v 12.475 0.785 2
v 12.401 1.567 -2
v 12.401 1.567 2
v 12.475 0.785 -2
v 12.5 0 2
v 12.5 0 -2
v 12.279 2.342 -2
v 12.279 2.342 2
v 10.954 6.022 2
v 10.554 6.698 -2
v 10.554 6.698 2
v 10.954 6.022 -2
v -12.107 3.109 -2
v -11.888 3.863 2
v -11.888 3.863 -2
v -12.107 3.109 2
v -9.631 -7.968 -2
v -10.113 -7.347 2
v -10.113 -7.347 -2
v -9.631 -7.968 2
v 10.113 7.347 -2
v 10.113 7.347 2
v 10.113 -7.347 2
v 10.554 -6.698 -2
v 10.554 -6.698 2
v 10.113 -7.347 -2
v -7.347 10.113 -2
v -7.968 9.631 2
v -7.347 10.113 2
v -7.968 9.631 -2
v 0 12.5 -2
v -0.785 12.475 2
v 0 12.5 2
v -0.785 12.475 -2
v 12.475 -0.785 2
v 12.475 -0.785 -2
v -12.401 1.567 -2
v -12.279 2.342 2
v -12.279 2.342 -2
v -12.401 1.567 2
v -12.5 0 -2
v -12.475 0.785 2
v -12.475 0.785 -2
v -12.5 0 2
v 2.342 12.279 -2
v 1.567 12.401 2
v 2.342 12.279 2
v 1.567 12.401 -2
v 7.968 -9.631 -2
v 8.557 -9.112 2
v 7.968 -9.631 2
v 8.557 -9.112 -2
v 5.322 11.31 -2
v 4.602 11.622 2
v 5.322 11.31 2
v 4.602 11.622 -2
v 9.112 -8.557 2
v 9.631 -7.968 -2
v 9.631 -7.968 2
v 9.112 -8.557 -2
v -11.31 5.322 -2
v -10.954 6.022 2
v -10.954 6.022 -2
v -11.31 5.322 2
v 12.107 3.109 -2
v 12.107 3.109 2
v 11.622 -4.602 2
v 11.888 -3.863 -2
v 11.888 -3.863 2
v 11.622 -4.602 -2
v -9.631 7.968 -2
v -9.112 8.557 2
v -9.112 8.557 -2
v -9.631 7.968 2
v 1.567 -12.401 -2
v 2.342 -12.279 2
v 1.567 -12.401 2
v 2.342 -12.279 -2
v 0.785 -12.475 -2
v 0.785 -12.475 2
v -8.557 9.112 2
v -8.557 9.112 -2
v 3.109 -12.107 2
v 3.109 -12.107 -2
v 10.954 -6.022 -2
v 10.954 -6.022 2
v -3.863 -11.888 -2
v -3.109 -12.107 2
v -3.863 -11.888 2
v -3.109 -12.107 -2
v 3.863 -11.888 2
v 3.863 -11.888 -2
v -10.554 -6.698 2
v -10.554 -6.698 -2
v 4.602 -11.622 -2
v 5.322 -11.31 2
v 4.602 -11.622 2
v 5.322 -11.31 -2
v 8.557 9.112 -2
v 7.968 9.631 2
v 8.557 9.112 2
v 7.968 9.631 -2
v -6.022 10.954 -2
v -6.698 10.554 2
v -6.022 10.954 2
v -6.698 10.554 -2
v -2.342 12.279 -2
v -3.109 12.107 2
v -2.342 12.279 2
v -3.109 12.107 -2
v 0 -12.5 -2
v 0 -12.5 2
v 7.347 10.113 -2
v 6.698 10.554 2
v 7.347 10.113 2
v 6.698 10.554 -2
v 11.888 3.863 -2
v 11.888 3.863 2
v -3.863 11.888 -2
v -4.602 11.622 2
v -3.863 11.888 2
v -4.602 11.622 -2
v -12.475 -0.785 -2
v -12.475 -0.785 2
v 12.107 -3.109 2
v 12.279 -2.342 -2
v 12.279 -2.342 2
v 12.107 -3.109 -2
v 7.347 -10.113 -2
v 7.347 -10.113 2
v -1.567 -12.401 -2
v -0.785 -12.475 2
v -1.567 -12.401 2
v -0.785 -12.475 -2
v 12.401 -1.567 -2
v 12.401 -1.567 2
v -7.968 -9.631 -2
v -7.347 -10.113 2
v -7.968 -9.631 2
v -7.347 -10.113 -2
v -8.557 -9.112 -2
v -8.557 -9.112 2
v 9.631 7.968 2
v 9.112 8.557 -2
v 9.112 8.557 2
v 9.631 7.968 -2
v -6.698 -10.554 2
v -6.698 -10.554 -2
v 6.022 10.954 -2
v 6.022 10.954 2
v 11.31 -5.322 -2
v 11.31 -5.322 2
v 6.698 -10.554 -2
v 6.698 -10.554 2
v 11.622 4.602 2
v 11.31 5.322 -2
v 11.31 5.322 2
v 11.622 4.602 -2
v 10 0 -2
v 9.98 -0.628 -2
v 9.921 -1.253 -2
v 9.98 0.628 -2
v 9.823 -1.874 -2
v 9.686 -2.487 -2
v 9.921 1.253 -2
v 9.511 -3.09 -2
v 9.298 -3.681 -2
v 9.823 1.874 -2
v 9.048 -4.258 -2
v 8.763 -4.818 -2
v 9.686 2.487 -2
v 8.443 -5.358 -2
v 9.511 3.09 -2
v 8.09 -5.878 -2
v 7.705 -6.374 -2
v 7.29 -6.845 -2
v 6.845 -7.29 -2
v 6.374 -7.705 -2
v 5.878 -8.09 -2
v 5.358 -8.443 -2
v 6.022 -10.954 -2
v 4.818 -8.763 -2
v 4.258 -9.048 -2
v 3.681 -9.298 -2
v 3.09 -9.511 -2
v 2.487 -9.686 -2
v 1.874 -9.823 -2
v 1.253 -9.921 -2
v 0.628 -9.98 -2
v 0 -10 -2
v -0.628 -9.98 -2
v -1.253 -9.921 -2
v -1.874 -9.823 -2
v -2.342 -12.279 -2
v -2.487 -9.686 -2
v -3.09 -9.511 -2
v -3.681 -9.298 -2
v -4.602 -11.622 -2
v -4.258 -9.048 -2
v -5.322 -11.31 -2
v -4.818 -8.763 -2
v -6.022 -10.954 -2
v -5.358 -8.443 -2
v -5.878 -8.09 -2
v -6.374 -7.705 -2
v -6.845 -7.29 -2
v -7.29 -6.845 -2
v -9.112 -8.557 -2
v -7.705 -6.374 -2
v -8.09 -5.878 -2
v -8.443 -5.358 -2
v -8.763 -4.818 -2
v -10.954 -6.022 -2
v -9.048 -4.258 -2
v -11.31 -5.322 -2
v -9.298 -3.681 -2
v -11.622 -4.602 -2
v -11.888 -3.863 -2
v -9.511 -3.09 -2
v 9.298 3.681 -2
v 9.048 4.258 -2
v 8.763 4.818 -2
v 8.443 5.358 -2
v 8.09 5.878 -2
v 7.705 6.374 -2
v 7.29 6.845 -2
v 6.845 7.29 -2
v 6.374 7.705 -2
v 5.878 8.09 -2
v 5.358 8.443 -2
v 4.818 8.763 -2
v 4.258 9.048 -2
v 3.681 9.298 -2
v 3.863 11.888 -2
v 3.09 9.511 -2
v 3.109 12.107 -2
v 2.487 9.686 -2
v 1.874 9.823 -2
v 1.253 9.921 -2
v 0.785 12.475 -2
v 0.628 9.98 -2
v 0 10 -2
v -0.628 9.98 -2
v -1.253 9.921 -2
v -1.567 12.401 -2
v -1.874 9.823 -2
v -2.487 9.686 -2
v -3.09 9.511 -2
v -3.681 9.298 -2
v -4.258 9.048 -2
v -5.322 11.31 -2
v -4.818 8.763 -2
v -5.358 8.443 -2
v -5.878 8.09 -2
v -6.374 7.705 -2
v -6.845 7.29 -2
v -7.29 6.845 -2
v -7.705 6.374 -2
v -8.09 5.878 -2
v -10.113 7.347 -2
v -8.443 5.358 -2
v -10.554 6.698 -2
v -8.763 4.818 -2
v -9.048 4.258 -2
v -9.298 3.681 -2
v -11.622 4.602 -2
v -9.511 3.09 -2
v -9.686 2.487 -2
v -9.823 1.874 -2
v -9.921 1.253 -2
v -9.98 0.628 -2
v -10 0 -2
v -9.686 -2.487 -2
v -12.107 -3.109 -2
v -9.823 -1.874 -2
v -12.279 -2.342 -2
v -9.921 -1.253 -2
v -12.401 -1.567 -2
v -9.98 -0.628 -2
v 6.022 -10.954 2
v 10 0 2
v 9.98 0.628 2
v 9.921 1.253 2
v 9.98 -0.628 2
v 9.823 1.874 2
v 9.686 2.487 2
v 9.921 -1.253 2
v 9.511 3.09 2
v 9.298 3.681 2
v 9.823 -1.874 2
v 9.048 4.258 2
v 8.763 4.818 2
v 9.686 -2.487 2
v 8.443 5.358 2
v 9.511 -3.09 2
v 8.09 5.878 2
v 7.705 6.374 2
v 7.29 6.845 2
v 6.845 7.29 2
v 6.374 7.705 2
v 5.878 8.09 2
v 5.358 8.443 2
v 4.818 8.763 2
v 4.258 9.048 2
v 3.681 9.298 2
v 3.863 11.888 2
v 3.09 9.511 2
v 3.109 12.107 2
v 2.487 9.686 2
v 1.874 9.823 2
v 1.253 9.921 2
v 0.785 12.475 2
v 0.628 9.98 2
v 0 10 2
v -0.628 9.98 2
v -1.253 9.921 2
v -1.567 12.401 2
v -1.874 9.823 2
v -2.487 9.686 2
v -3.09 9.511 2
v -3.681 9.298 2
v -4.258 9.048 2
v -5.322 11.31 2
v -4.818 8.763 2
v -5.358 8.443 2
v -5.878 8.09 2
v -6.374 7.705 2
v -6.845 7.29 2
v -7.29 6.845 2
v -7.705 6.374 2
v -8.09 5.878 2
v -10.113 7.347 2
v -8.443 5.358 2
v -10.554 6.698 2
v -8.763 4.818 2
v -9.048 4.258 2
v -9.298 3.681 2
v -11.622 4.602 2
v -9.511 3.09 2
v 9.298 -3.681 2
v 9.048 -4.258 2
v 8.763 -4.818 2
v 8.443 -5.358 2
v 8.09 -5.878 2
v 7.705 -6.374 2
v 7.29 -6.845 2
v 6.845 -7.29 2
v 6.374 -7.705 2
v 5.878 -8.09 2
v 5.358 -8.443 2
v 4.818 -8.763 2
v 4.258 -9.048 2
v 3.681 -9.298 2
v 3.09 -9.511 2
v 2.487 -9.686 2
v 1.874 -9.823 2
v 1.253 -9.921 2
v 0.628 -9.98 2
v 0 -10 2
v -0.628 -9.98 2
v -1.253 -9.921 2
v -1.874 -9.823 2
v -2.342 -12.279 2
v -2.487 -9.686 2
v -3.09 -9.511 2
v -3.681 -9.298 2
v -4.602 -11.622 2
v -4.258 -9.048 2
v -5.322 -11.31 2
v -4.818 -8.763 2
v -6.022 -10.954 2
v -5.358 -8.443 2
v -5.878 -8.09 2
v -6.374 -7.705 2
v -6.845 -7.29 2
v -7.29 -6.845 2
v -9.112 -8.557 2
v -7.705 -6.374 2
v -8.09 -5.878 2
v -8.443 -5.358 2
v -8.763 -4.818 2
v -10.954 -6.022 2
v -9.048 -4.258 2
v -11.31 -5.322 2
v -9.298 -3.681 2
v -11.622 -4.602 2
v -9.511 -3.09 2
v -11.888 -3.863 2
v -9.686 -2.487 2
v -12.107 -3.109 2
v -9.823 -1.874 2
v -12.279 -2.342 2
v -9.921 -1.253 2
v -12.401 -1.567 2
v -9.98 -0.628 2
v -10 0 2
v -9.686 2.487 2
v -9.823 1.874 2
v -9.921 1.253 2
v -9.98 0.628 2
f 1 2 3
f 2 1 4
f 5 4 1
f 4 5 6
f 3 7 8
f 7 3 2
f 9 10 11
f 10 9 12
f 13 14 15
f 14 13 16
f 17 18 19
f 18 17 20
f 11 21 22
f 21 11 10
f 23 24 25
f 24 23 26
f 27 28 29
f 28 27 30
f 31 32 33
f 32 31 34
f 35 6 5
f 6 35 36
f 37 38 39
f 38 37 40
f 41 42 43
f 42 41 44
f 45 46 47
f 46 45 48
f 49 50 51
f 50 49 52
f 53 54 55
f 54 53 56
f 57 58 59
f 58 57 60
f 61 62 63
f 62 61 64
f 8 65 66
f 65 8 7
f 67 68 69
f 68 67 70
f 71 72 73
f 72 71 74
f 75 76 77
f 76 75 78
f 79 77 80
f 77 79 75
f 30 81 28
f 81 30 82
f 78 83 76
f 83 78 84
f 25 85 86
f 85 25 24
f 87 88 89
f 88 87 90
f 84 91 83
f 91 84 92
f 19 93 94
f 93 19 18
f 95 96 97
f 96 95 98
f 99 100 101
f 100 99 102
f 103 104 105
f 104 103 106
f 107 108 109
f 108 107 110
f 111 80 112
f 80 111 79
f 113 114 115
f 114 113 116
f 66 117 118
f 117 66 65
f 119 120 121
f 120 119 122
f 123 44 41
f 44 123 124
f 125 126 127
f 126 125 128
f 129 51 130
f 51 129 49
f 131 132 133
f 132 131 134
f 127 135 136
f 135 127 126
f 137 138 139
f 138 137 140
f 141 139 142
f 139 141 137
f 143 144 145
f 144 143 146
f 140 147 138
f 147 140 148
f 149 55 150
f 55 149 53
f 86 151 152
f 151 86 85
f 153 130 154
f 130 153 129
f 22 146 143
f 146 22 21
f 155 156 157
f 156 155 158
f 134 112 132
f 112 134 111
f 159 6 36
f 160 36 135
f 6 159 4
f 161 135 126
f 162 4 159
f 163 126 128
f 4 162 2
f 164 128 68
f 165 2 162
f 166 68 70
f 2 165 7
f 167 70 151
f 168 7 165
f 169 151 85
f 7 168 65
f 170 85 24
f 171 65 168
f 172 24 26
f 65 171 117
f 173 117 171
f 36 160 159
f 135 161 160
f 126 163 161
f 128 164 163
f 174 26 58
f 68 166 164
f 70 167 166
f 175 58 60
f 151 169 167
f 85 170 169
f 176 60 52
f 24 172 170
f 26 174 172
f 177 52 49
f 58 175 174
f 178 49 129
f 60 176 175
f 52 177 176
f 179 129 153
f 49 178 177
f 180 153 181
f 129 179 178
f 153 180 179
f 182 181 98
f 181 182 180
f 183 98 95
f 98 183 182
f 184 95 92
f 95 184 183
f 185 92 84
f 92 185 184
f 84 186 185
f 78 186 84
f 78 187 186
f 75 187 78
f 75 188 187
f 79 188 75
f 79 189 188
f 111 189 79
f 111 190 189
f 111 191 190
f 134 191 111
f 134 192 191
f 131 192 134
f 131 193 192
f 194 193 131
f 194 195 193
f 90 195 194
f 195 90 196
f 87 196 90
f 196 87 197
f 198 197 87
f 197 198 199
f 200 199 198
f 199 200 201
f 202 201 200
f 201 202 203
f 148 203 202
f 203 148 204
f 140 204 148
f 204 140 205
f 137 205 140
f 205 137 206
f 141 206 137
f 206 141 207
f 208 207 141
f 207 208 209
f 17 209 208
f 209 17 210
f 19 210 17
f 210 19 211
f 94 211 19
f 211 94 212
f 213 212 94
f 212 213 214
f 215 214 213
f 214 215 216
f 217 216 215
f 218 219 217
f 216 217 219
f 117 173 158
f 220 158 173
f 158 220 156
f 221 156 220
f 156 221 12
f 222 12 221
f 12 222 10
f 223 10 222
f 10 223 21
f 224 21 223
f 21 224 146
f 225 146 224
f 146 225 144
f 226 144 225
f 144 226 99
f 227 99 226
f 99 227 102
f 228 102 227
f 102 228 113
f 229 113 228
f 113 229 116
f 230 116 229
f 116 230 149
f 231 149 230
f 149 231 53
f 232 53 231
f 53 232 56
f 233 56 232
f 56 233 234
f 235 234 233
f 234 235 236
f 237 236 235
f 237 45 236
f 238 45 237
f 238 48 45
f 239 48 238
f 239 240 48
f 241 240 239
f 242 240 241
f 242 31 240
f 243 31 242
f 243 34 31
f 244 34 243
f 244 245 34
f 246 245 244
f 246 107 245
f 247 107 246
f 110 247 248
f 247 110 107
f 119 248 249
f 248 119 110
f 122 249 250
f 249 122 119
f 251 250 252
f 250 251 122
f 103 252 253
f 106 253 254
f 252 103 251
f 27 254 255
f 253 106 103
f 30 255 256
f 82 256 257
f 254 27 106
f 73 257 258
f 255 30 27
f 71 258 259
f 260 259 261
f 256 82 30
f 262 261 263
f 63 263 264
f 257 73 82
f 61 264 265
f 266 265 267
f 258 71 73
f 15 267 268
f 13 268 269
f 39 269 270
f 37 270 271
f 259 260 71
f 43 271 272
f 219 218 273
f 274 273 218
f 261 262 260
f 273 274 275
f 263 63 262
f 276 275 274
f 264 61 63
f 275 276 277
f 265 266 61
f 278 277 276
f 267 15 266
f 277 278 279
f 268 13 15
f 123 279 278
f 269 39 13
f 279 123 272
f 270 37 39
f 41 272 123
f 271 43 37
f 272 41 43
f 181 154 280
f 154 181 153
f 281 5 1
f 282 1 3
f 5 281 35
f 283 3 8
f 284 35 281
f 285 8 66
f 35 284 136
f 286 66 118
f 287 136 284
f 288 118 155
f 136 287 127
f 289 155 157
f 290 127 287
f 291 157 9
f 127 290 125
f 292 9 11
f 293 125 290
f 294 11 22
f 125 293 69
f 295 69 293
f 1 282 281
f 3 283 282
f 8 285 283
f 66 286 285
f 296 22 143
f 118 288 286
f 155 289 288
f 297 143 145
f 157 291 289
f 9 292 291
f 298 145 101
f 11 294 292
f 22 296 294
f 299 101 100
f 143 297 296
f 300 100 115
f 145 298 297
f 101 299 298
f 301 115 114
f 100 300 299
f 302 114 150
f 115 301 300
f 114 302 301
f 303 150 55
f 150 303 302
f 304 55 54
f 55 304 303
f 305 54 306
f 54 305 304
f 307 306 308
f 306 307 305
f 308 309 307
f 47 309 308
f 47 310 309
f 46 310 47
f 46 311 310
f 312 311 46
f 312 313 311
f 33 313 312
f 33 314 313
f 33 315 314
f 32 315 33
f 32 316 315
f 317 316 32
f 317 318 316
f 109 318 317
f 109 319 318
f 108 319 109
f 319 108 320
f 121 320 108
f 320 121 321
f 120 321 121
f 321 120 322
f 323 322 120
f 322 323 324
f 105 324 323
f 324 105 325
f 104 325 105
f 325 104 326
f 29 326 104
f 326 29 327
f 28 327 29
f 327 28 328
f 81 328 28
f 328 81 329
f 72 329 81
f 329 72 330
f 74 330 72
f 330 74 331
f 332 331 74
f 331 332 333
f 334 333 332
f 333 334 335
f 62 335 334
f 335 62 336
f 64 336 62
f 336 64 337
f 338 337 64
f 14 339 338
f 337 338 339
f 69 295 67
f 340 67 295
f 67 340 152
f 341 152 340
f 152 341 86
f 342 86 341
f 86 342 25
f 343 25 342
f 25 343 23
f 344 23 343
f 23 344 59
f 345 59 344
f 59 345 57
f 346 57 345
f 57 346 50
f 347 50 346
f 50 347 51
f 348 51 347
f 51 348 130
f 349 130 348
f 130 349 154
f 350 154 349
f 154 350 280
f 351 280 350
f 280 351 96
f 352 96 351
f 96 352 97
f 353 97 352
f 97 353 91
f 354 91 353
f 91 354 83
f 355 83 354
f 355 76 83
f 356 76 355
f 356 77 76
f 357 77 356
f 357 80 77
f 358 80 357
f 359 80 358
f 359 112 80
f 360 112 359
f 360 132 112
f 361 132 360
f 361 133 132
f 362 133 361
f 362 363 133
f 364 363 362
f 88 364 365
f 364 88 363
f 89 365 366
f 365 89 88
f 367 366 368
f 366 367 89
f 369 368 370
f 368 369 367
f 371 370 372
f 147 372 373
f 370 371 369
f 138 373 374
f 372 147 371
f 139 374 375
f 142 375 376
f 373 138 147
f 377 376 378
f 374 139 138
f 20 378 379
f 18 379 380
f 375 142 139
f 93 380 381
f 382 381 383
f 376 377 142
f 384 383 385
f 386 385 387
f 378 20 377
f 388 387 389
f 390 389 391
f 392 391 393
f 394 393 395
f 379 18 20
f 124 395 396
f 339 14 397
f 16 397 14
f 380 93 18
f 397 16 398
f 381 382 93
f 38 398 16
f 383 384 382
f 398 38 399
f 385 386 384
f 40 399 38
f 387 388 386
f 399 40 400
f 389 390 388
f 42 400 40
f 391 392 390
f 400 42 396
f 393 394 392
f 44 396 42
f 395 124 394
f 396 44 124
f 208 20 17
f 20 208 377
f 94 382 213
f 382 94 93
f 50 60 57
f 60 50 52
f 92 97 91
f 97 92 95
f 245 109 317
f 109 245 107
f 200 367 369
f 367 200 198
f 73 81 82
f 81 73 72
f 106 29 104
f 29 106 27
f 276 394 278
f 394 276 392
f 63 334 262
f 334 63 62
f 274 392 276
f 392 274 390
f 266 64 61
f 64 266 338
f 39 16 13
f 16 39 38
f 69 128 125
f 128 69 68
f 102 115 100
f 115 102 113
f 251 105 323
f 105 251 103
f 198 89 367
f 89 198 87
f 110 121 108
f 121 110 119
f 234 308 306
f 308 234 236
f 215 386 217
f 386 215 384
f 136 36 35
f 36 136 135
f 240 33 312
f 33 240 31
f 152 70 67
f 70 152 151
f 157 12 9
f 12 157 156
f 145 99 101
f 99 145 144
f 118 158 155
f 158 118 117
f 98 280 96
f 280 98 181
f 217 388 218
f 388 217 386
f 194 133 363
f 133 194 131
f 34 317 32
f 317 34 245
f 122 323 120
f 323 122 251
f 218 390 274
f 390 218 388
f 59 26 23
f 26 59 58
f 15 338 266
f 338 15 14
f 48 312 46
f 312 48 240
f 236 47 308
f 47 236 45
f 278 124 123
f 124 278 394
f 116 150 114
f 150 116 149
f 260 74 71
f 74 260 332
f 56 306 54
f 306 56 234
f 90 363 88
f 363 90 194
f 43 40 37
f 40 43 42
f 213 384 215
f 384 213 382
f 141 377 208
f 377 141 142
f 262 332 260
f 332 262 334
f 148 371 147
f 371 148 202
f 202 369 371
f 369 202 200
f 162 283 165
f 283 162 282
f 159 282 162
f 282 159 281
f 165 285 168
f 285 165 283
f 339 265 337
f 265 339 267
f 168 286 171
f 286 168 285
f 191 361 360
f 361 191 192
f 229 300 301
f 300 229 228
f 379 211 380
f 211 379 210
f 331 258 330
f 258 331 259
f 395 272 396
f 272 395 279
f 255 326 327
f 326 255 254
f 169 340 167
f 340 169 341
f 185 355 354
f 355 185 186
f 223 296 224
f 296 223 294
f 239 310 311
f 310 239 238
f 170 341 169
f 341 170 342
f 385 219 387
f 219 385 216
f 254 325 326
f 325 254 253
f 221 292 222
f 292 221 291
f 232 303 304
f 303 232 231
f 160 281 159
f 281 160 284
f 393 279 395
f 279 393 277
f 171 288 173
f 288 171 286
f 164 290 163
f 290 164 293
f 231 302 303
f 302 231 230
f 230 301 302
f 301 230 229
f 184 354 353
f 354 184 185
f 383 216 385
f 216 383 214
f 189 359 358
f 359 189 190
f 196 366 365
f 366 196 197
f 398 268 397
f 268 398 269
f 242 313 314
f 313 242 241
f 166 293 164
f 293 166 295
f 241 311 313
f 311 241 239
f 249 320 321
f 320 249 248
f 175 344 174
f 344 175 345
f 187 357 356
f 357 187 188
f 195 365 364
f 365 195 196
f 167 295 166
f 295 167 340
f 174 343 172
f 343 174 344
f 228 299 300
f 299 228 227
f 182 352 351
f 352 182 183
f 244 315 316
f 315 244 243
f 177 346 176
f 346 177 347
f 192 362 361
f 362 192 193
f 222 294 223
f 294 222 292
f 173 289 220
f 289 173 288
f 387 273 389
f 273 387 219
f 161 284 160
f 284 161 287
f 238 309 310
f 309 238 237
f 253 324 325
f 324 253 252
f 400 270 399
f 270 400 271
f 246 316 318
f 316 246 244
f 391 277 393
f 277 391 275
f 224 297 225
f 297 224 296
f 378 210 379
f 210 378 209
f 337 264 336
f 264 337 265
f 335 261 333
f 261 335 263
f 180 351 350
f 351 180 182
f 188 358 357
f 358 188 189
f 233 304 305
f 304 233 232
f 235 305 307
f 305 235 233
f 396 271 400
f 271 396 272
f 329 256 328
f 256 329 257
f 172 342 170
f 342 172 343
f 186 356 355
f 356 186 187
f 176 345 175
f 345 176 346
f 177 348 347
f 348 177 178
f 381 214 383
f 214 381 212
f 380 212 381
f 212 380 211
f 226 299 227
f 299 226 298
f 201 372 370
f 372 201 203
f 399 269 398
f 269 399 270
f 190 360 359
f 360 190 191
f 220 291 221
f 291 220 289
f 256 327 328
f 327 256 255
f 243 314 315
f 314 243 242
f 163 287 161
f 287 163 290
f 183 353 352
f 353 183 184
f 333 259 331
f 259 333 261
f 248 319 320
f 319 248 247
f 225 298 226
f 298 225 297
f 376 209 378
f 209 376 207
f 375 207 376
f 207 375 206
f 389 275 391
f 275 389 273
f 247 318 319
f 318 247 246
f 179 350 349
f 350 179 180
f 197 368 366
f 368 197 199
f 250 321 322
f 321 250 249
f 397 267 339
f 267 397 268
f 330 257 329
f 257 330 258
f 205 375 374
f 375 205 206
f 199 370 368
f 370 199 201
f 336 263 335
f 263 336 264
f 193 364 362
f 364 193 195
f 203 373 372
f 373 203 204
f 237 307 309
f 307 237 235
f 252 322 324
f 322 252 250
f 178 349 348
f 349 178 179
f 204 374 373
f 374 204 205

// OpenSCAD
// file: dimensions.scad
capsule_length = 37.5;
capsule_dia = 12.5; // 13 - 0.5

capsule_flat_y=1.5;
reed_length=14;
// actually reed_dia = 2;
reed_dia = 3.2;


outer_stud_width = 2;
middle_stud_width = 2;

connector_x=6;
connector_y=2;
connector_gap_mill_z = 4;
mating_tolerance = 0.1;


tube_inner_dia = 13;
tube_outer_dia = 16;

magnet2_innerdia = 20;
magnet2_outerdia = 25;
magnet2_length = 4;
// main file
$fn = 100;
include <dimensions.scad>;

module magnet2()
{
    difference()
    {
        cylinder(magnet2_length, d=magnet2_outerdia, center=true);
        cylinder(magnet2_length, d=magnet2_innerdia, center=true);
    }
}
magnet2();
